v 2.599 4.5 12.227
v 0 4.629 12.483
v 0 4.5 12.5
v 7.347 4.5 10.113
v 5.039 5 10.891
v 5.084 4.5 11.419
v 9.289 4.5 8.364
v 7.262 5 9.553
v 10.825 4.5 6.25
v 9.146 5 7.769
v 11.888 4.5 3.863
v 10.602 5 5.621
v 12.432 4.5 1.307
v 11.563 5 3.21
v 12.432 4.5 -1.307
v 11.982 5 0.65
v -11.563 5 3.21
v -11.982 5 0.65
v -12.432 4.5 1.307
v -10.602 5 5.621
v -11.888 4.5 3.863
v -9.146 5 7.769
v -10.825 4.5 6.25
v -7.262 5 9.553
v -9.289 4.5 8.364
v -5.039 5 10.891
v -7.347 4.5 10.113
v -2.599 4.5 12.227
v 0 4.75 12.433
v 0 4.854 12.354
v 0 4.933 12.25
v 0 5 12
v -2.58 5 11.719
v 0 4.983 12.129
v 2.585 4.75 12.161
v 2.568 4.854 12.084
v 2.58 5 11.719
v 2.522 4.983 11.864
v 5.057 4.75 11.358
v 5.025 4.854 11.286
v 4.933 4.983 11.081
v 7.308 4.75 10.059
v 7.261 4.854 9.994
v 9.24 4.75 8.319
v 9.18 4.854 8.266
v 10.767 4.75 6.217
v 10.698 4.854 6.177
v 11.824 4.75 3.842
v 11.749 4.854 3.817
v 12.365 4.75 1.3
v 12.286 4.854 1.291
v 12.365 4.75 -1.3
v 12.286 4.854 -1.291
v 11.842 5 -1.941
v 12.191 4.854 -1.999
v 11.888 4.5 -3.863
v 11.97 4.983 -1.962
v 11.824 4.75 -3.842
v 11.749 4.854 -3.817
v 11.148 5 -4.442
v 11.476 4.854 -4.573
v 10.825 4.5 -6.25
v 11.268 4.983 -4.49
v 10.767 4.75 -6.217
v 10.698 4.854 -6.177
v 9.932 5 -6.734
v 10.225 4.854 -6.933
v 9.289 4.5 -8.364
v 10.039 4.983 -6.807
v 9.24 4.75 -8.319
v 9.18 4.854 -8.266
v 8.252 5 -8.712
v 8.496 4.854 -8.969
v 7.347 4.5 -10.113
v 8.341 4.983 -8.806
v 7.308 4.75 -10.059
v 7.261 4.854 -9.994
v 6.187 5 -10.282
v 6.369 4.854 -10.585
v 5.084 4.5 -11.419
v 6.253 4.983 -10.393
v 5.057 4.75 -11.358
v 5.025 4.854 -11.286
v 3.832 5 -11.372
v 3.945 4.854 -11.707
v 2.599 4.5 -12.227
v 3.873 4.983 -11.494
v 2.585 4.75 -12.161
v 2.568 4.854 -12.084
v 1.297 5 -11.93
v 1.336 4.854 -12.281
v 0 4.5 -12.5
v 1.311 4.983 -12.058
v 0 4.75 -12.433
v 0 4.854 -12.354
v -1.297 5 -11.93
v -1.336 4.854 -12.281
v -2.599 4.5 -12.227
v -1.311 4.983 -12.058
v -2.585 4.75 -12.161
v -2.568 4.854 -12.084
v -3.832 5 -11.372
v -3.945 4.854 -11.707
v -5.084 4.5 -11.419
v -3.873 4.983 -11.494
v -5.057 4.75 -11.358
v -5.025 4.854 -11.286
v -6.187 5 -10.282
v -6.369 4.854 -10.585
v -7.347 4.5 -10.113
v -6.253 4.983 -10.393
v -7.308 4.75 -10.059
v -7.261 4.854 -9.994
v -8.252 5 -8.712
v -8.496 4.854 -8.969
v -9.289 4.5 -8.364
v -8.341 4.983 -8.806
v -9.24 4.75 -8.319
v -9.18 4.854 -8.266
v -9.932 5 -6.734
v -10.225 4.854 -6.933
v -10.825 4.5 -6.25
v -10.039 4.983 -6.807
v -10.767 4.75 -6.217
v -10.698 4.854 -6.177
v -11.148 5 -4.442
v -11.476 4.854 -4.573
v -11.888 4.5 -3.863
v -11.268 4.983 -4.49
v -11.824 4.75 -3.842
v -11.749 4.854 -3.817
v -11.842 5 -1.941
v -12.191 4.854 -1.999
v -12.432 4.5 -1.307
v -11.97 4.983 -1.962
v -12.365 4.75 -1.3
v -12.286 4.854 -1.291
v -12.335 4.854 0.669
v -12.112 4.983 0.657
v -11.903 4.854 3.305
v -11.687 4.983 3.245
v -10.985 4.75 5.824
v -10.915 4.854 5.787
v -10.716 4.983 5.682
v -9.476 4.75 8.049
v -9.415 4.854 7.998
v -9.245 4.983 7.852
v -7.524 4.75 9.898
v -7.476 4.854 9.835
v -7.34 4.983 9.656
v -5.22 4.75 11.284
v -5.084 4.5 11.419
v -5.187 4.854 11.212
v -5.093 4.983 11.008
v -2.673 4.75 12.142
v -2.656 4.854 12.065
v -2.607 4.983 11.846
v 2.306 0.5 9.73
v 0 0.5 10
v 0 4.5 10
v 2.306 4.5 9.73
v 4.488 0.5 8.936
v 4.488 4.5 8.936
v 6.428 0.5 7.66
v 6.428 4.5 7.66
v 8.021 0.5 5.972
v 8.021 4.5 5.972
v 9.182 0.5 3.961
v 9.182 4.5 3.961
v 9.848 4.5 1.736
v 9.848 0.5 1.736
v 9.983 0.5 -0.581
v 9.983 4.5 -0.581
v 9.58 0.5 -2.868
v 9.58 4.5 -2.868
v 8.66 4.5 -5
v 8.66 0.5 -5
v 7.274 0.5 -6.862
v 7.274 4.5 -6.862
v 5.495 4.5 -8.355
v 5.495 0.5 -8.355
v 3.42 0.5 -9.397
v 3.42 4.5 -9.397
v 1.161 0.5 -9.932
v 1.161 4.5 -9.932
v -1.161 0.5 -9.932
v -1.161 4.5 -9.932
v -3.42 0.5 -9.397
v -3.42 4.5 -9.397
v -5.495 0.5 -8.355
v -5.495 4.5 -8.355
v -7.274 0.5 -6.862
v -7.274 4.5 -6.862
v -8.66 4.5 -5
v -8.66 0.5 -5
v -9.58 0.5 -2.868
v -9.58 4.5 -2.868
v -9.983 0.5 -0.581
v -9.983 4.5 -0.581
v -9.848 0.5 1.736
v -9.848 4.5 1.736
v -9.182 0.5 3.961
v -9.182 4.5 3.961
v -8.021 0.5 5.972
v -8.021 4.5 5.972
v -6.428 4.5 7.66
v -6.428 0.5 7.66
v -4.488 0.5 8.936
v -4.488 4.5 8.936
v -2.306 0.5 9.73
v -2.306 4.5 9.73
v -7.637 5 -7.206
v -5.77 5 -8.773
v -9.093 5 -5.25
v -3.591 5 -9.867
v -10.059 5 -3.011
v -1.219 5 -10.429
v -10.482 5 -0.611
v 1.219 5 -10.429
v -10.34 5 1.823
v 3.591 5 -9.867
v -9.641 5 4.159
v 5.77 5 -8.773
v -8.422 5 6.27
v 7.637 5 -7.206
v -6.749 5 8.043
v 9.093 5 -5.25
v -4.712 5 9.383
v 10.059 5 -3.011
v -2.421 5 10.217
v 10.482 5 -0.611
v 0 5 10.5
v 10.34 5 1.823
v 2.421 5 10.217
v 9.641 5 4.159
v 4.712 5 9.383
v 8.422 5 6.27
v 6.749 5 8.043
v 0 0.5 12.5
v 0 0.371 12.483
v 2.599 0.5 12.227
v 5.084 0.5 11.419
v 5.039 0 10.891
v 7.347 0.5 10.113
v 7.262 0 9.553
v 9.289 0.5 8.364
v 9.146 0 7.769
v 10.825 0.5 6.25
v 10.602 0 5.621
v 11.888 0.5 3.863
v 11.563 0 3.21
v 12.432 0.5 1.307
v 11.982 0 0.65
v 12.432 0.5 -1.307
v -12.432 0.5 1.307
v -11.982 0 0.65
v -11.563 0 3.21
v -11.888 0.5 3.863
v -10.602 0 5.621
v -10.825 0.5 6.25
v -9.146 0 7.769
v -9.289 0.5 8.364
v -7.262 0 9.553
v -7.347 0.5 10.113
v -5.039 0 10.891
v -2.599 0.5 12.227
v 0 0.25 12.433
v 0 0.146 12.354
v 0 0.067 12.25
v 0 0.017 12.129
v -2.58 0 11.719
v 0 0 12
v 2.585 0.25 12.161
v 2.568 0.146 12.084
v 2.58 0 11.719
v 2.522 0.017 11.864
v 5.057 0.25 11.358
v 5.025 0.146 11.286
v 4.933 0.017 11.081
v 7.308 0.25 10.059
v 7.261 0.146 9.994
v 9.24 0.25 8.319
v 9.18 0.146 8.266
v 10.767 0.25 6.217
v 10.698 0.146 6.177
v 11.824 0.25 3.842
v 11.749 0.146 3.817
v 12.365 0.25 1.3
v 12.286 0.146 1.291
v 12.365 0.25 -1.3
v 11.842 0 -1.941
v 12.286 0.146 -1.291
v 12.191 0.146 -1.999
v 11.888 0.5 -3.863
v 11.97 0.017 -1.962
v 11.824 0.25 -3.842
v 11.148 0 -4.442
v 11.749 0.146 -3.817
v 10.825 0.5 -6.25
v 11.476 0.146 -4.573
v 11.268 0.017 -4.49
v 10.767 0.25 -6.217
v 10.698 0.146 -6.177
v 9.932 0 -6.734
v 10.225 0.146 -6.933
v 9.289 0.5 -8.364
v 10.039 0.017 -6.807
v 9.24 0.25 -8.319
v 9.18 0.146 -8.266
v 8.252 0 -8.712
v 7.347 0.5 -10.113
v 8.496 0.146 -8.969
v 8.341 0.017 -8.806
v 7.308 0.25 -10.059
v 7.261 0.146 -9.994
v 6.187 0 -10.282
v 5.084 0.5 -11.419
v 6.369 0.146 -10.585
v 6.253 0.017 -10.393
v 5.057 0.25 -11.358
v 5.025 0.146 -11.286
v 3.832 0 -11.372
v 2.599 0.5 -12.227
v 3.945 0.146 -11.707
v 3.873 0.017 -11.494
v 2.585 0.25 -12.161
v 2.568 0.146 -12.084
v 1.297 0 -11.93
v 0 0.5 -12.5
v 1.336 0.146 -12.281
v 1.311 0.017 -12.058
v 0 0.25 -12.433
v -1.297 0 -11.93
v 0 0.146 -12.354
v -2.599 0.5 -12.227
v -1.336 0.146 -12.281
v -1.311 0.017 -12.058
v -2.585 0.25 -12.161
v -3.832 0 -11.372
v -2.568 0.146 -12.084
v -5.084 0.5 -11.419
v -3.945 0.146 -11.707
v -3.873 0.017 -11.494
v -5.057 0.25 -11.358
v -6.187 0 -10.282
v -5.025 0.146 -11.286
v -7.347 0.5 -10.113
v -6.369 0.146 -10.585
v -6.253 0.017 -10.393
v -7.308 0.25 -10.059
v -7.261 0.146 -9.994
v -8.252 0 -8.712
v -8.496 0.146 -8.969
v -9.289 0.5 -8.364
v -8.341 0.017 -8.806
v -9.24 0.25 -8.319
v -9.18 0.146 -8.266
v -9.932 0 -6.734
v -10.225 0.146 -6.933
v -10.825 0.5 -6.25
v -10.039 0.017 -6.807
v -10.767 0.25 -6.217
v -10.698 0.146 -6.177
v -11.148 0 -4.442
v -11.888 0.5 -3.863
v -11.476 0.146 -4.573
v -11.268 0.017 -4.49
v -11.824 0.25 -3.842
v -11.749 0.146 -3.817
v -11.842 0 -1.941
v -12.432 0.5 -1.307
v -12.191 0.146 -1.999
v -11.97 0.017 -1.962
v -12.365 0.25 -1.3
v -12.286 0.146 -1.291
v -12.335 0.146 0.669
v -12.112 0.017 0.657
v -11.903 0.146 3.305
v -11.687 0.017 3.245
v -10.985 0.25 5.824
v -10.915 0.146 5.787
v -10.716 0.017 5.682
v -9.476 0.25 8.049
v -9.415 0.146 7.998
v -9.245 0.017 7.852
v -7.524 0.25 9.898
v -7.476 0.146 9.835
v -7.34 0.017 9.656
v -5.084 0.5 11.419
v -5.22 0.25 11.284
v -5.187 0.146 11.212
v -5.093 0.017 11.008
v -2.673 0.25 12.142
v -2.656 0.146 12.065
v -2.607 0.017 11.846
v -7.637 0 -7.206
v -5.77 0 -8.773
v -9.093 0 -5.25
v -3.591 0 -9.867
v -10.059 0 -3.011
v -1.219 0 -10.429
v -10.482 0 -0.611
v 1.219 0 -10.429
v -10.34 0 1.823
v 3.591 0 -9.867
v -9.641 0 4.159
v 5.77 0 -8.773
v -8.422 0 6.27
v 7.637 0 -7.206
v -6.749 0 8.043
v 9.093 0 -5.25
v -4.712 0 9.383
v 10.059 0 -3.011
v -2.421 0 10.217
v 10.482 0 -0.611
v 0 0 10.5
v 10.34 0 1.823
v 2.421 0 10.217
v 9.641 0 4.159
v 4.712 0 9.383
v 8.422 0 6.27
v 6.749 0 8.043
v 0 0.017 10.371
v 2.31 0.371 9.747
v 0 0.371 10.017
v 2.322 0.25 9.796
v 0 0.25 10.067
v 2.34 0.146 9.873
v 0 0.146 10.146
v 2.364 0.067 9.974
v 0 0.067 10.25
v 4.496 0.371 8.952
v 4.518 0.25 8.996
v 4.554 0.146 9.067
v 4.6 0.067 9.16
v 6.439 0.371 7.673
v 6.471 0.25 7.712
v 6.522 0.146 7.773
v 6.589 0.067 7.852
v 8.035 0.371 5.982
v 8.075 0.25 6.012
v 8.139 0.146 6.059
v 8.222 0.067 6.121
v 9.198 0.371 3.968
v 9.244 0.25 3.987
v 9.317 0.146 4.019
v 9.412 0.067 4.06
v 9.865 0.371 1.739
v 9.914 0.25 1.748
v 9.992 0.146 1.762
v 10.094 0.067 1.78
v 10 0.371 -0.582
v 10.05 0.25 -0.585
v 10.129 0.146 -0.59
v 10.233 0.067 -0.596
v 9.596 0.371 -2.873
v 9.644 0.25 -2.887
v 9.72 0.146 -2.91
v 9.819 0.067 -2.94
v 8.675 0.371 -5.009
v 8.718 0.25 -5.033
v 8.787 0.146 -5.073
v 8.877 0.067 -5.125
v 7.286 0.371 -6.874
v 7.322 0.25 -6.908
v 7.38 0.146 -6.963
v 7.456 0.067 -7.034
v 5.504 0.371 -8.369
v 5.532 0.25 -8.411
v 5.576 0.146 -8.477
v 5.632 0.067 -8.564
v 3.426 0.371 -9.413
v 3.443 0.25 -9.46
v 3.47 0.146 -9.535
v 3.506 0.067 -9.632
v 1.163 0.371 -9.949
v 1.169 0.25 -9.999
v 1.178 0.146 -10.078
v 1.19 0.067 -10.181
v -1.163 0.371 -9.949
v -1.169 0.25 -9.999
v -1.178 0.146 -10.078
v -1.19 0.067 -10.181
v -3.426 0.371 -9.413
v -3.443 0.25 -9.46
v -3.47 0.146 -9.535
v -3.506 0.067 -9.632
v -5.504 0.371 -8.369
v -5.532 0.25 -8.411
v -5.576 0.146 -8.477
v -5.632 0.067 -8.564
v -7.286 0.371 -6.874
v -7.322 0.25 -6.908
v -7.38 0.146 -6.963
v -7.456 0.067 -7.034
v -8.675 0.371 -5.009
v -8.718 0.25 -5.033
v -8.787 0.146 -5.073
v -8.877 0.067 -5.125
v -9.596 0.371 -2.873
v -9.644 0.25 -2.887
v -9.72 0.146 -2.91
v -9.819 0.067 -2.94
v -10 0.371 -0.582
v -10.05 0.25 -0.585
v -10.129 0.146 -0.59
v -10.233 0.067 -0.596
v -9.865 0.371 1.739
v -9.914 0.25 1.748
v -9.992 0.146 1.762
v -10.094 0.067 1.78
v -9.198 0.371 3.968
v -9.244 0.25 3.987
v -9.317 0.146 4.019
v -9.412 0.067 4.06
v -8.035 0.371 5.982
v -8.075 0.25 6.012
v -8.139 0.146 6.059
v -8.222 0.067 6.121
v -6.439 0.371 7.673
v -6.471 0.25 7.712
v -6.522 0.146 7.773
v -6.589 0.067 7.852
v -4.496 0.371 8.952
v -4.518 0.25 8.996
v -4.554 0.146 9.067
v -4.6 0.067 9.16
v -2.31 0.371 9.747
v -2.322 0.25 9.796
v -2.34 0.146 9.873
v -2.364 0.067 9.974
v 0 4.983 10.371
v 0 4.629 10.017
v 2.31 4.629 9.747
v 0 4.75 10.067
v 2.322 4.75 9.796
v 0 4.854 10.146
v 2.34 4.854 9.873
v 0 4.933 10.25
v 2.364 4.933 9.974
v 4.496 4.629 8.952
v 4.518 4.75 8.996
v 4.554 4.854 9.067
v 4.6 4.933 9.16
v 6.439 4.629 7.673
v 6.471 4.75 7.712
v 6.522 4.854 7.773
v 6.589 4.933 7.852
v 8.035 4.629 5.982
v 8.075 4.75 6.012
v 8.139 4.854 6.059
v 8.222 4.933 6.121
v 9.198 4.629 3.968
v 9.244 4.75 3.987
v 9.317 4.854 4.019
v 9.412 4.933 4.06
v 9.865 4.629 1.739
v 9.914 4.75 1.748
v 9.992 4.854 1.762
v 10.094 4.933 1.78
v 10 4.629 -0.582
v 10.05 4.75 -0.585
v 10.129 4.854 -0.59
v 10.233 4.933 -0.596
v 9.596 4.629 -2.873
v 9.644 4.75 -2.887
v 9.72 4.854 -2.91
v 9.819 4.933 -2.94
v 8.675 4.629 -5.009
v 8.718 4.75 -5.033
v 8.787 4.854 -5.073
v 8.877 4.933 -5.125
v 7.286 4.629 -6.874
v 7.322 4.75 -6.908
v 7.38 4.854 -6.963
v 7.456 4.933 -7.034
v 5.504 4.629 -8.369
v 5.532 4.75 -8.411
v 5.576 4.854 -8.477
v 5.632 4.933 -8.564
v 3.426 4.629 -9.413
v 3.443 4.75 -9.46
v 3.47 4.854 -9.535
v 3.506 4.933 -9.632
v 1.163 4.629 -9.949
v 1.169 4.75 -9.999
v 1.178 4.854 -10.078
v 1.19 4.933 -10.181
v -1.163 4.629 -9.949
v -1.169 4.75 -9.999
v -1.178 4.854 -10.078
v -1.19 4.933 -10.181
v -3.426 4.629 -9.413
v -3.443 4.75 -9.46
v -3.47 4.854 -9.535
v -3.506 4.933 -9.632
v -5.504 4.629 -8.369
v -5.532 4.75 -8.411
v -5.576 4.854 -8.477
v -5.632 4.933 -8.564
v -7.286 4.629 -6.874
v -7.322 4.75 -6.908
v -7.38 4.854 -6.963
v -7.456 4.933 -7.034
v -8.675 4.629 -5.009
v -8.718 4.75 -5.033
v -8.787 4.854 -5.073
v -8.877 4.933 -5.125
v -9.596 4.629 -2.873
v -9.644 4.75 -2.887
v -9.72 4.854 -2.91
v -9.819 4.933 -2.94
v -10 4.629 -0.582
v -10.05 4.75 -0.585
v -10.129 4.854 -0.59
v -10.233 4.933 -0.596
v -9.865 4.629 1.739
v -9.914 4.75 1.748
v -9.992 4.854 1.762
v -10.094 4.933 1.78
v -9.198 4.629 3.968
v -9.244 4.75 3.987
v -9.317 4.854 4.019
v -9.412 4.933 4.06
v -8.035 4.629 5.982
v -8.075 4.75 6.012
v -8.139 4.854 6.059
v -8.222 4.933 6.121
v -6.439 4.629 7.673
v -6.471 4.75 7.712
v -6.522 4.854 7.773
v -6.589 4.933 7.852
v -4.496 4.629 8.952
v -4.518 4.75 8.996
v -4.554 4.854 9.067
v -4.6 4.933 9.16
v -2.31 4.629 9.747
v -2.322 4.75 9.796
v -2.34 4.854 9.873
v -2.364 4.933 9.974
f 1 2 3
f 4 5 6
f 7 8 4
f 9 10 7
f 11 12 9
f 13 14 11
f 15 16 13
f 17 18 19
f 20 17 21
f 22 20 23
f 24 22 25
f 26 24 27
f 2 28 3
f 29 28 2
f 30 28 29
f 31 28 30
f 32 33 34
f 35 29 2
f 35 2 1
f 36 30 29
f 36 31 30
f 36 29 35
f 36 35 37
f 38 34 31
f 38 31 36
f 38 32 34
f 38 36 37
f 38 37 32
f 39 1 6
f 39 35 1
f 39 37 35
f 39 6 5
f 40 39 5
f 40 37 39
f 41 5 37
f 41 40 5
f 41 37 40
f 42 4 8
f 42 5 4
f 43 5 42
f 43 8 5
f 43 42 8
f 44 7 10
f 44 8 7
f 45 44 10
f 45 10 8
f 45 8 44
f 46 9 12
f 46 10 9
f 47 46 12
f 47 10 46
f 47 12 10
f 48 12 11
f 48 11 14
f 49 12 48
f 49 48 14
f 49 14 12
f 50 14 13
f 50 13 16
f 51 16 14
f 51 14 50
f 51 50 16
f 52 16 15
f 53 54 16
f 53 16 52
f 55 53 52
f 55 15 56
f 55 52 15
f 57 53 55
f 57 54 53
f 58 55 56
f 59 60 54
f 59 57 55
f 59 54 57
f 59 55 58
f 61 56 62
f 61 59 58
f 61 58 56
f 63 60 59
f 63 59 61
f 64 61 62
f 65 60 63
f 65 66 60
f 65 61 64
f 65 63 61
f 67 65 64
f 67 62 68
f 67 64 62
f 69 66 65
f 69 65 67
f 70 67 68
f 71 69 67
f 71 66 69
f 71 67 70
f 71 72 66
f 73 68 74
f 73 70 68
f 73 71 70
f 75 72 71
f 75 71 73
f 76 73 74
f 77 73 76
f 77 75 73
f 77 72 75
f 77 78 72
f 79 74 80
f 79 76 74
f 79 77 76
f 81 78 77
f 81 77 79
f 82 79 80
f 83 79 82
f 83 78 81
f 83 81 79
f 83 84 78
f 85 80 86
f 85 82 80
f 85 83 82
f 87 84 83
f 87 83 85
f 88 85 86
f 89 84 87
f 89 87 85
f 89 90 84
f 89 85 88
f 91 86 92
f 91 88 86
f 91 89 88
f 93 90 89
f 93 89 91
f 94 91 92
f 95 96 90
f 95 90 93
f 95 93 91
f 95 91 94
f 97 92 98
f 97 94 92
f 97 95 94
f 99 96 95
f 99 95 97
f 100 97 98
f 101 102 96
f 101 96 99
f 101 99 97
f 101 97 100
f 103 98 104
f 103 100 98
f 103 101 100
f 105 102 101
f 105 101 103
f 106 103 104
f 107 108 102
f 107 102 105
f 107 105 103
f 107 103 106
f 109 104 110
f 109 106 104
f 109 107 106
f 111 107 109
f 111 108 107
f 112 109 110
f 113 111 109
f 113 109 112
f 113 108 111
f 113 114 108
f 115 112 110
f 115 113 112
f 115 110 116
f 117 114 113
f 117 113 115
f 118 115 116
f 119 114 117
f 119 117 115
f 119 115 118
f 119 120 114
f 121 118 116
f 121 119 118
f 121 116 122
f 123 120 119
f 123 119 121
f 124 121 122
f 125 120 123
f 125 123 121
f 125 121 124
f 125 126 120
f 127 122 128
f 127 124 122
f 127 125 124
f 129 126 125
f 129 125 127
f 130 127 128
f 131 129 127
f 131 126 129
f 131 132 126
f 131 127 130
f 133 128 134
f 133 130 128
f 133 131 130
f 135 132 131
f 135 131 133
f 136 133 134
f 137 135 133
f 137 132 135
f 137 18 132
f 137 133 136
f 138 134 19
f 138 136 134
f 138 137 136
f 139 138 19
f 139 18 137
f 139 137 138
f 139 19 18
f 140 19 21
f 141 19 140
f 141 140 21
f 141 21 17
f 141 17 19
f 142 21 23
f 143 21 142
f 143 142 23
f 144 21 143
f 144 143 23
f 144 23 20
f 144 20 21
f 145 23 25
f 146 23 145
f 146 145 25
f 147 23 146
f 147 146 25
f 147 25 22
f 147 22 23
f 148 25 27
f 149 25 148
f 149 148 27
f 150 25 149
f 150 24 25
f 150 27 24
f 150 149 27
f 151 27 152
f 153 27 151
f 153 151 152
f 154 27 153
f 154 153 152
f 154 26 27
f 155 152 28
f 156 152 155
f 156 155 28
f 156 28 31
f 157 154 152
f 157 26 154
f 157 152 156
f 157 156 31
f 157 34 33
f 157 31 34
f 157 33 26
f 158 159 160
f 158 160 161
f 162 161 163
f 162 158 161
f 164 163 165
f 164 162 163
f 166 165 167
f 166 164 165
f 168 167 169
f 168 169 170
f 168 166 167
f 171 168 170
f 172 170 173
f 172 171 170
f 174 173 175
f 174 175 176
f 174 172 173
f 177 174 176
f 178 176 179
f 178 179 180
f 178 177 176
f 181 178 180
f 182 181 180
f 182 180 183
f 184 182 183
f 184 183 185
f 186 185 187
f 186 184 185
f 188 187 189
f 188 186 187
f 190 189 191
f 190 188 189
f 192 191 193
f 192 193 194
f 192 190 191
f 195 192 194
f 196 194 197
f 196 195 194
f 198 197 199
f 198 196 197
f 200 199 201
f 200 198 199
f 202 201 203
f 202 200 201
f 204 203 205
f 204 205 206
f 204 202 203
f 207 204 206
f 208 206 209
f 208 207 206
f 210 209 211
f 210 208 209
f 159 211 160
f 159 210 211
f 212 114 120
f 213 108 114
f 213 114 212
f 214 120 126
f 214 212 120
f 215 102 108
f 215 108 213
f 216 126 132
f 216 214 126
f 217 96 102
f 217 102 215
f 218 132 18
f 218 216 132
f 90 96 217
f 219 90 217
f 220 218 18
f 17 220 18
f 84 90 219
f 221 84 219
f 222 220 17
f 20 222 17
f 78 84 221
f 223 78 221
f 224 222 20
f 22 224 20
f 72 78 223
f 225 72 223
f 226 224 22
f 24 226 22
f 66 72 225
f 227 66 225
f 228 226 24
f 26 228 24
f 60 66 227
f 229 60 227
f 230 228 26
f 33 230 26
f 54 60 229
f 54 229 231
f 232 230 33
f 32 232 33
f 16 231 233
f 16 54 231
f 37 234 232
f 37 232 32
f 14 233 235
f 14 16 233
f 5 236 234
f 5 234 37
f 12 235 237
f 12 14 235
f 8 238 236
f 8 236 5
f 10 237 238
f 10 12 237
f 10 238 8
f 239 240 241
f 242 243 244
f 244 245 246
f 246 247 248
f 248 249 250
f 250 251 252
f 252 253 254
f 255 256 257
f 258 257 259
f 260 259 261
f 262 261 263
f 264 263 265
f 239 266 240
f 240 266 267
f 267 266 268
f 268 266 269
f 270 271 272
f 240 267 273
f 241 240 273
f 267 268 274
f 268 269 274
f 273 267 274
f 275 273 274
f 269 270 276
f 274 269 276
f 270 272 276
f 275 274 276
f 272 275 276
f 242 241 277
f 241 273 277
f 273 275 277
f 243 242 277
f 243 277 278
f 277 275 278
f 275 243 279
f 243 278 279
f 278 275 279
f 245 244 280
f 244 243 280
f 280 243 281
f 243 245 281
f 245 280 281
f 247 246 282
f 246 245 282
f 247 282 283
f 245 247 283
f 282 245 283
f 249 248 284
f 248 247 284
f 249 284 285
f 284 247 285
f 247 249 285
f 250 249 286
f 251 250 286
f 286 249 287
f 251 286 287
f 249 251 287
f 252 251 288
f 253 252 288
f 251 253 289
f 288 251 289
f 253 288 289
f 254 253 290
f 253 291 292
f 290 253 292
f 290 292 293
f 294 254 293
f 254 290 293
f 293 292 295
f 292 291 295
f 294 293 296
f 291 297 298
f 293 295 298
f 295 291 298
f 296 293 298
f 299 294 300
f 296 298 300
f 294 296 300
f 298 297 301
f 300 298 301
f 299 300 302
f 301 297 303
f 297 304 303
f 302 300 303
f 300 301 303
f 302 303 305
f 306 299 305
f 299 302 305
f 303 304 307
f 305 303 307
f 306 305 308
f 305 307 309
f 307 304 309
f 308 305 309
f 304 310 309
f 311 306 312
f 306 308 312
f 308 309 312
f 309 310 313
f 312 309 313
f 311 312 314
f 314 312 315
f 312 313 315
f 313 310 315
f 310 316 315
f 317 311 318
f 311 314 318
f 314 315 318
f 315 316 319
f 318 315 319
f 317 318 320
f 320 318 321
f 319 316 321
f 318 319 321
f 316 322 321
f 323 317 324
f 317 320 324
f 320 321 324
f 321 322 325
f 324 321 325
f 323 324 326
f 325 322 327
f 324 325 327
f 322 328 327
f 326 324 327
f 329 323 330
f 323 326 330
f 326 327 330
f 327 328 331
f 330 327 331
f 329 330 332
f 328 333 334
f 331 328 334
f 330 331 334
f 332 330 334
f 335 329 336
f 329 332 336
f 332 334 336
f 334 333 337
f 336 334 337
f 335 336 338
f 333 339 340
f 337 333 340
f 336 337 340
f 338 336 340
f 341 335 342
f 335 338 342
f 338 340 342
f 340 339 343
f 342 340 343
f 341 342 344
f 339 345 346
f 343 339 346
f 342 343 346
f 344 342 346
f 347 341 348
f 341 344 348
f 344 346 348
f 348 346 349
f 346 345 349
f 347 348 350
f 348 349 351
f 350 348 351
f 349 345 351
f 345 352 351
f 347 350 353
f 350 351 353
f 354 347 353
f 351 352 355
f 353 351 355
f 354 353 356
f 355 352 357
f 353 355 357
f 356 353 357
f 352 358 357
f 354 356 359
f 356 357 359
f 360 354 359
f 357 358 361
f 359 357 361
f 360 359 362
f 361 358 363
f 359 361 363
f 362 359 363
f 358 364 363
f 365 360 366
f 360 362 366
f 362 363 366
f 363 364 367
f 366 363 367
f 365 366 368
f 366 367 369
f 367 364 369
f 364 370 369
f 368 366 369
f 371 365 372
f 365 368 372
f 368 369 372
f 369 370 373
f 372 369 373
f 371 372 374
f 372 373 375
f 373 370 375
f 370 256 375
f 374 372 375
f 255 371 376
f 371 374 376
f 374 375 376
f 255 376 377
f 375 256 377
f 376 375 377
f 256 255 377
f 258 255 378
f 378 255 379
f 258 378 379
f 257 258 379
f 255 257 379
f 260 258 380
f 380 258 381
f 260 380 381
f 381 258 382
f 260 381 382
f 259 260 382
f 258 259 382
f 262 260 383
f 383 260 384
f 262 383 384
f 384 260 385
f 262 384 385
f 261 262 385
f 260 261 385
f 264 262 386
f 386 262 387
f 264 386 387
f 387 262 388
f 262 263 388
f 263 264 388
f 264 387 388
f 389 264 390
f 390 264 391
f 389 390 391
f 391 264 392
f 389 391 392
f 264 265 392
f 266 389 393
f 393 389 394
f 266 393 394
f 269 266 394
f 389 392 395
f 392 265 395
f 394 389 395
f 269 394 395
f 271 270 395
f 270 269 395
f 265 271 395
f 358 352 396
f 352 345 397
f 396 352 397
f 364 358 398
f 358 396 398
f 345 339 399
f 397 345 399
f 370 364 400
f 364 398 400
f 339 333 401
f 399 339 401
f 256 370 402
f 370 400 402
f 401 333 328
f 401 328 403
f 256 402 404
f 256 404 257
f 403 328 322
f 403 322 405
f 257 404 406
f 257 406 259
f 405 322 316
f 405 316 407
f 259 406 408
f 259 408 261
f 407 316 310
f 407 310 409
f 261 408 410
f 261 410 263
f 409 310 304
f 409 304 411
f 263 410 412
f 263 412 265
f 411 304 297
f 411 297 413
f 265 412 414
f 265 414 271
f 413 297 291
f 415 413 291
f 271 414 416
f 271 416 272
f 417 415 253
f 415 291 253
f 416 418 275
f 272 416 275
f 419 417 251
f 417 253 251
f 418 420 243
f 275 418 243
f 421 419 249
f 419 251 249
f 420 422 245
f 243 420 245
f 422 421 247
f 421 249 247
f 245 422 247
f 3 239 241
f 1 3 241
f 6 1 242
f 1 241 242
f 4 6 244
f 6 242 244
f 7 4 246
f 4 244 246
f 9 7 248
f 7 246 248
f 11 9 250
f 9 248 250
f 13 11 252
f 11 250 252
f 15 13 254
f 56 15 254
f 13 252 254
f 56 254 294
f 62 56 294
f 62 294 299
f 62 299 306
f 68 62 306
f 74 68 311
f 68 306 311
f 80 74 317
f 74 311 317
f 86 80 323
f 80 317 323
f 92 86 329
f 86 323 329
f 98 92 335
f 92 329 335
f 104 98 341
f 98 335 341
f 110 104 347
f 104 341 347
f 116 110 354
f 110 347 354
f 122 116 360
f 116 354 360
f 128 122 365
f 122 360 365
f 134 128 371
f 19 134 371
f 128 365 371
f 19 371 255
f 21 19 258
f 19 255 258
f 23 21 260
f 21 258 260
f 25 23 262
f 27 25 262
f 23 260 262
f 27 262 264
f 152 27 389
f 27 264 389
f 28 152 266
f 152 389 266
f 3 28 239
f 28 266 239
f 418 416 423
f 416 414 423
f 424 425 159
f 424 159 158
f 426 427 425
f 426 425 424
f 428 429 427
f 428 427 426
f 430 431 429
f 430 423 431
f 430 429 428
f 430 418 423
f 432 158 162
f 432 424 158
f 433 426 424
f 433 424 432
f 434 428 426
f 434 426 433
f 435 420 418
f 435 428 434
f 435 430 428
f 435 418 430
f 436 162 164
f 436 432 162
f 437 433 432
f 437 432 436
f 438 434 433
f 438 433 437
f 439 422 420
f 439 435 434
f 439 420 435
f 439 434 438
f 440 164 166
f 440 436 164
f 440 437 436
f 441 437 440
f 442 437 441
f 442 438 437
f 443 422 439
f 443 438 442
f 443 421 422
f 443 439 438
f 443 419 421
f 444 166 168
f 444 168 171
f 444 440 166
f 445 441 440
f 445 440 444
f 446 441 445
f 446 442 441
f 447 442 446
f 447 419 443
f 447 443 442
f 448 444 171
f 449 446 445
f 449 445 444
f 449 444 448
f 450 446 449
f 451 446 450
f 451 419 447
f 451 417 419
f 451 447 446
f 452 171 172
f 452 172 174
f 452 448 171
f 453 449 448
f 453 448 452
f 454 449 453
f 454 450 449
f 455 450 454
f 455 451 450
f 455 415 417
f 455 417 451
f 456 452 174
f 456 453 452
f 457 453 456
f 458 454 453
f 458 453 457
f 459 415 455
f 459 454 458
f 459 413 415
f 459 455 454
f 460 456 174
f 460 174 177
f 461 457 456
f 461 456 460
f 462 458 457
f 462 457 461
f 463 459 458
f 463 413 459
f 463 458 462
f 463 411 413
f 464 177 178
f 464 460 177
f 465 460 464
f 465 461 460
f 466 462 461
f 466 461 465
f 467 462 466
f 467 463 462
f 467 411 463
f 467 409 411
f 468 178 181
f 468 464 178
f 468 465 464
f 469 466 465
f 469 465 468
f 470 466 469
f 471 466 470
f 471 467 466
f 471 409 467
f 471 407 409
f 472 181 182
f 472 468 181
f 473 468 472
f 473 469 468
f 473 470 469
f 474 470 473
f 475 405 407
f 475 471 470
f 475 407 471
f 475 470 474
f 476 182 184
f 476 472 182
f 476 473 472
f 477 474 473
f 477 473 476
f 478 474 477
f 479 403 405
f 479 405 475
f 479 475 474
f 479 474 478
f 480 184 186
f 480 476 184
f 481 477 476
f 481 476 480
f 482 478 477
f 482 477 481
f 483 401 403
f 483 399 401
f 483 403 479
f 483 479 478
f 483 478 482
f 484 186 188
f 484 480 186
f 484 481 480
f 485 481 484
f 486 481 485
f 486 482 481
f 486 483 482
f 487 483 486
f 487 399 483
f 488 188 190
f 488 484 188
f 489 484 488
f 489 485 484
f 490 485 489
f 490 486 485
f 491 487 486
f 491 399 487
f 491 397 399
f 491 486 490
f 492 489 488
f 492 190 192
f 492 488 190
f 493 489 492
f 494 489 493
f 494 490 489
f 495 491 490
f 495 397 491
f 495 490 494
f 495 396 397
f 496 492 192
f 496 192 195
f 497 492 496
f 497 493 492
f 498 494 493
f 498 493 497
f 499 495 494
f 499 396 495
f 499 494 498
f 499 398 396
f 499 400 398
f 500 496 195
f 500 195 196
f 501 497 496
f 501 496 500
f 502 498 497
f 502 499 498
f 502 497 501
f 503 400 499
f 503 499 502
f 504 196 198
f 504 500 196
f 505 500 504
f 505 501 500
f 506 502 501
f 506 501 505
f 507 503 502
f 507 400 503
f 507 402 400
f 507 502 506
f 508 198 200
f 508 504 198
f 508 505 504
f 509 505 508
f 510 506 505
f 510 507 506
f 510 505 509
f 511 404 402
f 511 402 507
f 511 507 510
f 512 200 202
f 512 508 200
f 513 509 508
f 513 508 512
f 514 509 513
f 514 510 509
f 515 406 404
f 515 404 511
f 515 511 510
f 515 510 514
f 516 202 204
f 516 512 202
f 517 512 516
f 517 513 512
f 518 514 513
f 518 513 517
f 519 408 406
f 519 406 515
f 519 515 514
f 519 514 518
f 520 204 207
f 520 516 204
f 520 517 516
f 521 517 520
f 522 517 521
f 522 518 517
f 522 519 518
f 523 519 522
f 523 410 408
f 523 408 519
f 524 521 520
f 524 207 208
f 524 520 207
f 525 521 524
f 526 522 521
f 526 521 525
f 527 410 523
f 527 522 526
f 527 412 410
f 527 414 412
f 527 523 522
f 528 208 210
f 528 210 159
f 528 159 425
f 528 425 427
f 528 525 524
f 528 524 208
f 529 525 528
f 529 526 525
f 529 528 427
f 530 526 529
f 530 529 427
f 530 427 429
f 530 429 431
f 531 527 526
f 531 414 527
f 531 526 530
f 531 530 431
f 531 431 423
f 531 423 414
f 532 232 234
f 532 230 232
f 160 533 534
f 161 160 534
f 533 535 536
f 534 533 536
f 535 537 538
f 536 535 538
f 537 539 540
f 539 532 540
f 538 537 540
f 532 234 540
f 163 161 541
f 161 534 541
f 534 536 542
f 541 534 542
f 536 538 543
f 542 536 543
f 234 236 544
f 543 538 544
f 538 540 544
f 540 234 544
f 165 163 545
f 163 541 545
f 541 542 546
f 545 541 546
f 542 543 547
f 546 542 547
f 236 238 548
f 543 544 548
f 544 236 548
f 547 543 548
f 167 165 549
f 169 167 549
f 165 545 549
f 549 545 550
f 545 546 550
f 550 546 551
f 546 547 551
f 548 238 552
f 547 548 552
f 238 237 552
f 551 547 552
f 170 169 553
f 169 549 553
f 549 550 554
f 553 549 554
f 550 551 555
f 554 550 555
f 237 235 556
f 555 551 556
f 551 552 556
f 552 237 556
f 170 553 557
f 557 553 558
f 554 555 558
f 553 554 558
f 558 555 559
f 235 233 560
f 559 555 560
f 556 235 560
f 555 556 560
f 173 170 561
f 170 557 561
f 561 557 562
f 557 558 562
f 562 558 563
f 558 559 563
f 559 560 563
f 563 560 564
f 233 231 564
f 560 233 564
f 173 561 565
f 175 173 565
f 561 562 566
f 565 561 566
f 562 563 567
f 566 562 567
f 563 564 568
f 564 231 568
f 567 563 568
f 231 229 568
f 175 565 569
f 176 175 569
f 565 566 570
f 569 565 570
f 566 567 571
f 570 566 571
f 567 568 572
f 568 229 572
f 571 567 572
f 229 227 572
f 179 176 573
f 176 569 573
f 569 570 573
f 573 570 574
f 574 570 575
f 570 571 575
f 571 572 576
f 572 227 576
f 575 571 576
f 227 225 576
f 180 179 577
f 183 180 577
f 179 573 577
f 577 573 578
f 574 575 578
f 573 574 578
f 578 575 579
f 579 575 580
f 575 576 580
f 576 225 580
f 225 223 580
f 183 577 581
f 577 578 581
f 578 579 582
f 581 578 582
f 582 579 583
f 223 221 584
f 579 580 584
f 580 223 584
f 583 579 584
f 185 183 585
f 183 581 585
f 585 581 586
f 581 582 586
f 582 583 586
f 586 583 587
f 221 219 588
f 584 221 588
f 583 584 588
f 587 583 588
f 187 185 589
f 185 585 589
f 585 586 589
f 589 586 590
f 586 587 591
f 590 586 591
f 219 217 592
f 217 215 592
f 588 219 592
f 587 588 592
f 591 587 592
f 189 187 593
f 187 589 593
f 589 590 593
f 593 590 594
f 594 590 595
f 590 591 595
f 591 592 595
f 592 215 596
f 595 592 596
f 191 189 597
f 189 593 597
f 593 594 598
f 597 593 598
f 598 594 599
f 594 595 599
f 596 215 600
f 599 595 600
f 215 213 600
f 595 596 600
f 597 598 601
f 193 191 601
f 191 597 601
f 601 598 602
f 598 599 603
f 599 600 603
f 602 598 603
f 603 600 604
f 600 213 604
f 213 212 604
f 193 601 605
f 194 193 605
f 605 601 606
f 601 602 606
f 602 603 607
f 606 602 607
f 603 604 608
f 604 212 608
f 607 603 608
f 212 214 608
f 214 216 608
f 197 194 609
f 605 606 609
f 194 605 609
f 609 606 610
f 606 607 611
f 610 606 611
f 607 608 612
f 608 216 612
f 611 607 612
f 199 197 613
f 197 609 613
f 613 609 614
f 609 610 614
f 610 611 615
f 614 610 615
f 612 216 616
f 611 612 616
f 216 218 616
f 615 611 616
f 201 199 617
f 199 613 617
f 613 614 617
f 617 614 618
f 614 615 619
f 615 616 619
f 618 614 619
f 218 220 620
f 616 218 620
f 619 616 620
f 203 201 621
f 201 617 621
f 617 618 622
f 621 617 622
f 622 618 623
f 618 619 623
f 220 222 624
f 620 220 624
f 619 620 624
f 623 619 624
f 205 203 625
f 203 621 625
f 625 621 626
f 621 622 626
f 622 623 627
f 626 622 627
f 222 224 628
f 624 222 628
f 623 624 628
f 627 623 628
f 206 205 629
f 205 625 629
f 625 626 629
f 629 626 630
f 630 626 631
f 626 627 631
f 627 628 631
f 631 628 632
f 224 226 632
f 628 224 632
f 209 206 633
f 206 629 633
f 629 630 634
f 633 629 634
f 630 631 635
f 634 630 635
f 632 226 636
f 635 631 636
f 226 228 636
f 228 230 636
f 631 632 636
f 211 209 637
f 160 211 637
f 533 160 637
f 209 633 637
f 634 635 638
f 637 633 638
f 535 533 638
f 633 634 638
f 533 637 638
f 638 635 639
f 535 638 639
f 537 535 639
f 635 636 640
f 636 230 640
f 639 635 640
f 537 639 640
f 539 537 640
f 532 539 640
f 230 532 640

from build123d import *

# Parameters (mm, degrees)
ESQUISSE1_R        = 12.5
ESQUISSE1_R_2      = 10
BOSS_EXTRU_1_DEPTH = 5
CONG_1_R           = 0.5


with BuildPart() as part:
    # Esquisse1 → Boss.-Extru.1 (new body)
    with BuildSketch(Plane(origin=(0, 0, 0), x_dir=(1, 0, 0), z_dir=(0, 1, 0))):
        with Locations(Location((0, 0, 0), (0, 0, 270))):
            Circle(ESQUISSE1_R)
        with Locations(Location((0, 0, 0), (0, 0, 270))):
            Circle(ESQUISSE1_R_2, mode=Mode.SUBTRACT)
    extrude(amount=BOSS_EXTRU_1_DEPTH)

    # Congé1
    cong_1_edges = [part.edges().sort_by_distance(p)[0] for p in [
        (0, 0, -12.5),
        (0, 5, -12.5),
        (0, 0, -10),
        (0, 5, -10),
    ]]
    fillet(cong_1_edges, radius=CONG_1_R)


solid = part.part
